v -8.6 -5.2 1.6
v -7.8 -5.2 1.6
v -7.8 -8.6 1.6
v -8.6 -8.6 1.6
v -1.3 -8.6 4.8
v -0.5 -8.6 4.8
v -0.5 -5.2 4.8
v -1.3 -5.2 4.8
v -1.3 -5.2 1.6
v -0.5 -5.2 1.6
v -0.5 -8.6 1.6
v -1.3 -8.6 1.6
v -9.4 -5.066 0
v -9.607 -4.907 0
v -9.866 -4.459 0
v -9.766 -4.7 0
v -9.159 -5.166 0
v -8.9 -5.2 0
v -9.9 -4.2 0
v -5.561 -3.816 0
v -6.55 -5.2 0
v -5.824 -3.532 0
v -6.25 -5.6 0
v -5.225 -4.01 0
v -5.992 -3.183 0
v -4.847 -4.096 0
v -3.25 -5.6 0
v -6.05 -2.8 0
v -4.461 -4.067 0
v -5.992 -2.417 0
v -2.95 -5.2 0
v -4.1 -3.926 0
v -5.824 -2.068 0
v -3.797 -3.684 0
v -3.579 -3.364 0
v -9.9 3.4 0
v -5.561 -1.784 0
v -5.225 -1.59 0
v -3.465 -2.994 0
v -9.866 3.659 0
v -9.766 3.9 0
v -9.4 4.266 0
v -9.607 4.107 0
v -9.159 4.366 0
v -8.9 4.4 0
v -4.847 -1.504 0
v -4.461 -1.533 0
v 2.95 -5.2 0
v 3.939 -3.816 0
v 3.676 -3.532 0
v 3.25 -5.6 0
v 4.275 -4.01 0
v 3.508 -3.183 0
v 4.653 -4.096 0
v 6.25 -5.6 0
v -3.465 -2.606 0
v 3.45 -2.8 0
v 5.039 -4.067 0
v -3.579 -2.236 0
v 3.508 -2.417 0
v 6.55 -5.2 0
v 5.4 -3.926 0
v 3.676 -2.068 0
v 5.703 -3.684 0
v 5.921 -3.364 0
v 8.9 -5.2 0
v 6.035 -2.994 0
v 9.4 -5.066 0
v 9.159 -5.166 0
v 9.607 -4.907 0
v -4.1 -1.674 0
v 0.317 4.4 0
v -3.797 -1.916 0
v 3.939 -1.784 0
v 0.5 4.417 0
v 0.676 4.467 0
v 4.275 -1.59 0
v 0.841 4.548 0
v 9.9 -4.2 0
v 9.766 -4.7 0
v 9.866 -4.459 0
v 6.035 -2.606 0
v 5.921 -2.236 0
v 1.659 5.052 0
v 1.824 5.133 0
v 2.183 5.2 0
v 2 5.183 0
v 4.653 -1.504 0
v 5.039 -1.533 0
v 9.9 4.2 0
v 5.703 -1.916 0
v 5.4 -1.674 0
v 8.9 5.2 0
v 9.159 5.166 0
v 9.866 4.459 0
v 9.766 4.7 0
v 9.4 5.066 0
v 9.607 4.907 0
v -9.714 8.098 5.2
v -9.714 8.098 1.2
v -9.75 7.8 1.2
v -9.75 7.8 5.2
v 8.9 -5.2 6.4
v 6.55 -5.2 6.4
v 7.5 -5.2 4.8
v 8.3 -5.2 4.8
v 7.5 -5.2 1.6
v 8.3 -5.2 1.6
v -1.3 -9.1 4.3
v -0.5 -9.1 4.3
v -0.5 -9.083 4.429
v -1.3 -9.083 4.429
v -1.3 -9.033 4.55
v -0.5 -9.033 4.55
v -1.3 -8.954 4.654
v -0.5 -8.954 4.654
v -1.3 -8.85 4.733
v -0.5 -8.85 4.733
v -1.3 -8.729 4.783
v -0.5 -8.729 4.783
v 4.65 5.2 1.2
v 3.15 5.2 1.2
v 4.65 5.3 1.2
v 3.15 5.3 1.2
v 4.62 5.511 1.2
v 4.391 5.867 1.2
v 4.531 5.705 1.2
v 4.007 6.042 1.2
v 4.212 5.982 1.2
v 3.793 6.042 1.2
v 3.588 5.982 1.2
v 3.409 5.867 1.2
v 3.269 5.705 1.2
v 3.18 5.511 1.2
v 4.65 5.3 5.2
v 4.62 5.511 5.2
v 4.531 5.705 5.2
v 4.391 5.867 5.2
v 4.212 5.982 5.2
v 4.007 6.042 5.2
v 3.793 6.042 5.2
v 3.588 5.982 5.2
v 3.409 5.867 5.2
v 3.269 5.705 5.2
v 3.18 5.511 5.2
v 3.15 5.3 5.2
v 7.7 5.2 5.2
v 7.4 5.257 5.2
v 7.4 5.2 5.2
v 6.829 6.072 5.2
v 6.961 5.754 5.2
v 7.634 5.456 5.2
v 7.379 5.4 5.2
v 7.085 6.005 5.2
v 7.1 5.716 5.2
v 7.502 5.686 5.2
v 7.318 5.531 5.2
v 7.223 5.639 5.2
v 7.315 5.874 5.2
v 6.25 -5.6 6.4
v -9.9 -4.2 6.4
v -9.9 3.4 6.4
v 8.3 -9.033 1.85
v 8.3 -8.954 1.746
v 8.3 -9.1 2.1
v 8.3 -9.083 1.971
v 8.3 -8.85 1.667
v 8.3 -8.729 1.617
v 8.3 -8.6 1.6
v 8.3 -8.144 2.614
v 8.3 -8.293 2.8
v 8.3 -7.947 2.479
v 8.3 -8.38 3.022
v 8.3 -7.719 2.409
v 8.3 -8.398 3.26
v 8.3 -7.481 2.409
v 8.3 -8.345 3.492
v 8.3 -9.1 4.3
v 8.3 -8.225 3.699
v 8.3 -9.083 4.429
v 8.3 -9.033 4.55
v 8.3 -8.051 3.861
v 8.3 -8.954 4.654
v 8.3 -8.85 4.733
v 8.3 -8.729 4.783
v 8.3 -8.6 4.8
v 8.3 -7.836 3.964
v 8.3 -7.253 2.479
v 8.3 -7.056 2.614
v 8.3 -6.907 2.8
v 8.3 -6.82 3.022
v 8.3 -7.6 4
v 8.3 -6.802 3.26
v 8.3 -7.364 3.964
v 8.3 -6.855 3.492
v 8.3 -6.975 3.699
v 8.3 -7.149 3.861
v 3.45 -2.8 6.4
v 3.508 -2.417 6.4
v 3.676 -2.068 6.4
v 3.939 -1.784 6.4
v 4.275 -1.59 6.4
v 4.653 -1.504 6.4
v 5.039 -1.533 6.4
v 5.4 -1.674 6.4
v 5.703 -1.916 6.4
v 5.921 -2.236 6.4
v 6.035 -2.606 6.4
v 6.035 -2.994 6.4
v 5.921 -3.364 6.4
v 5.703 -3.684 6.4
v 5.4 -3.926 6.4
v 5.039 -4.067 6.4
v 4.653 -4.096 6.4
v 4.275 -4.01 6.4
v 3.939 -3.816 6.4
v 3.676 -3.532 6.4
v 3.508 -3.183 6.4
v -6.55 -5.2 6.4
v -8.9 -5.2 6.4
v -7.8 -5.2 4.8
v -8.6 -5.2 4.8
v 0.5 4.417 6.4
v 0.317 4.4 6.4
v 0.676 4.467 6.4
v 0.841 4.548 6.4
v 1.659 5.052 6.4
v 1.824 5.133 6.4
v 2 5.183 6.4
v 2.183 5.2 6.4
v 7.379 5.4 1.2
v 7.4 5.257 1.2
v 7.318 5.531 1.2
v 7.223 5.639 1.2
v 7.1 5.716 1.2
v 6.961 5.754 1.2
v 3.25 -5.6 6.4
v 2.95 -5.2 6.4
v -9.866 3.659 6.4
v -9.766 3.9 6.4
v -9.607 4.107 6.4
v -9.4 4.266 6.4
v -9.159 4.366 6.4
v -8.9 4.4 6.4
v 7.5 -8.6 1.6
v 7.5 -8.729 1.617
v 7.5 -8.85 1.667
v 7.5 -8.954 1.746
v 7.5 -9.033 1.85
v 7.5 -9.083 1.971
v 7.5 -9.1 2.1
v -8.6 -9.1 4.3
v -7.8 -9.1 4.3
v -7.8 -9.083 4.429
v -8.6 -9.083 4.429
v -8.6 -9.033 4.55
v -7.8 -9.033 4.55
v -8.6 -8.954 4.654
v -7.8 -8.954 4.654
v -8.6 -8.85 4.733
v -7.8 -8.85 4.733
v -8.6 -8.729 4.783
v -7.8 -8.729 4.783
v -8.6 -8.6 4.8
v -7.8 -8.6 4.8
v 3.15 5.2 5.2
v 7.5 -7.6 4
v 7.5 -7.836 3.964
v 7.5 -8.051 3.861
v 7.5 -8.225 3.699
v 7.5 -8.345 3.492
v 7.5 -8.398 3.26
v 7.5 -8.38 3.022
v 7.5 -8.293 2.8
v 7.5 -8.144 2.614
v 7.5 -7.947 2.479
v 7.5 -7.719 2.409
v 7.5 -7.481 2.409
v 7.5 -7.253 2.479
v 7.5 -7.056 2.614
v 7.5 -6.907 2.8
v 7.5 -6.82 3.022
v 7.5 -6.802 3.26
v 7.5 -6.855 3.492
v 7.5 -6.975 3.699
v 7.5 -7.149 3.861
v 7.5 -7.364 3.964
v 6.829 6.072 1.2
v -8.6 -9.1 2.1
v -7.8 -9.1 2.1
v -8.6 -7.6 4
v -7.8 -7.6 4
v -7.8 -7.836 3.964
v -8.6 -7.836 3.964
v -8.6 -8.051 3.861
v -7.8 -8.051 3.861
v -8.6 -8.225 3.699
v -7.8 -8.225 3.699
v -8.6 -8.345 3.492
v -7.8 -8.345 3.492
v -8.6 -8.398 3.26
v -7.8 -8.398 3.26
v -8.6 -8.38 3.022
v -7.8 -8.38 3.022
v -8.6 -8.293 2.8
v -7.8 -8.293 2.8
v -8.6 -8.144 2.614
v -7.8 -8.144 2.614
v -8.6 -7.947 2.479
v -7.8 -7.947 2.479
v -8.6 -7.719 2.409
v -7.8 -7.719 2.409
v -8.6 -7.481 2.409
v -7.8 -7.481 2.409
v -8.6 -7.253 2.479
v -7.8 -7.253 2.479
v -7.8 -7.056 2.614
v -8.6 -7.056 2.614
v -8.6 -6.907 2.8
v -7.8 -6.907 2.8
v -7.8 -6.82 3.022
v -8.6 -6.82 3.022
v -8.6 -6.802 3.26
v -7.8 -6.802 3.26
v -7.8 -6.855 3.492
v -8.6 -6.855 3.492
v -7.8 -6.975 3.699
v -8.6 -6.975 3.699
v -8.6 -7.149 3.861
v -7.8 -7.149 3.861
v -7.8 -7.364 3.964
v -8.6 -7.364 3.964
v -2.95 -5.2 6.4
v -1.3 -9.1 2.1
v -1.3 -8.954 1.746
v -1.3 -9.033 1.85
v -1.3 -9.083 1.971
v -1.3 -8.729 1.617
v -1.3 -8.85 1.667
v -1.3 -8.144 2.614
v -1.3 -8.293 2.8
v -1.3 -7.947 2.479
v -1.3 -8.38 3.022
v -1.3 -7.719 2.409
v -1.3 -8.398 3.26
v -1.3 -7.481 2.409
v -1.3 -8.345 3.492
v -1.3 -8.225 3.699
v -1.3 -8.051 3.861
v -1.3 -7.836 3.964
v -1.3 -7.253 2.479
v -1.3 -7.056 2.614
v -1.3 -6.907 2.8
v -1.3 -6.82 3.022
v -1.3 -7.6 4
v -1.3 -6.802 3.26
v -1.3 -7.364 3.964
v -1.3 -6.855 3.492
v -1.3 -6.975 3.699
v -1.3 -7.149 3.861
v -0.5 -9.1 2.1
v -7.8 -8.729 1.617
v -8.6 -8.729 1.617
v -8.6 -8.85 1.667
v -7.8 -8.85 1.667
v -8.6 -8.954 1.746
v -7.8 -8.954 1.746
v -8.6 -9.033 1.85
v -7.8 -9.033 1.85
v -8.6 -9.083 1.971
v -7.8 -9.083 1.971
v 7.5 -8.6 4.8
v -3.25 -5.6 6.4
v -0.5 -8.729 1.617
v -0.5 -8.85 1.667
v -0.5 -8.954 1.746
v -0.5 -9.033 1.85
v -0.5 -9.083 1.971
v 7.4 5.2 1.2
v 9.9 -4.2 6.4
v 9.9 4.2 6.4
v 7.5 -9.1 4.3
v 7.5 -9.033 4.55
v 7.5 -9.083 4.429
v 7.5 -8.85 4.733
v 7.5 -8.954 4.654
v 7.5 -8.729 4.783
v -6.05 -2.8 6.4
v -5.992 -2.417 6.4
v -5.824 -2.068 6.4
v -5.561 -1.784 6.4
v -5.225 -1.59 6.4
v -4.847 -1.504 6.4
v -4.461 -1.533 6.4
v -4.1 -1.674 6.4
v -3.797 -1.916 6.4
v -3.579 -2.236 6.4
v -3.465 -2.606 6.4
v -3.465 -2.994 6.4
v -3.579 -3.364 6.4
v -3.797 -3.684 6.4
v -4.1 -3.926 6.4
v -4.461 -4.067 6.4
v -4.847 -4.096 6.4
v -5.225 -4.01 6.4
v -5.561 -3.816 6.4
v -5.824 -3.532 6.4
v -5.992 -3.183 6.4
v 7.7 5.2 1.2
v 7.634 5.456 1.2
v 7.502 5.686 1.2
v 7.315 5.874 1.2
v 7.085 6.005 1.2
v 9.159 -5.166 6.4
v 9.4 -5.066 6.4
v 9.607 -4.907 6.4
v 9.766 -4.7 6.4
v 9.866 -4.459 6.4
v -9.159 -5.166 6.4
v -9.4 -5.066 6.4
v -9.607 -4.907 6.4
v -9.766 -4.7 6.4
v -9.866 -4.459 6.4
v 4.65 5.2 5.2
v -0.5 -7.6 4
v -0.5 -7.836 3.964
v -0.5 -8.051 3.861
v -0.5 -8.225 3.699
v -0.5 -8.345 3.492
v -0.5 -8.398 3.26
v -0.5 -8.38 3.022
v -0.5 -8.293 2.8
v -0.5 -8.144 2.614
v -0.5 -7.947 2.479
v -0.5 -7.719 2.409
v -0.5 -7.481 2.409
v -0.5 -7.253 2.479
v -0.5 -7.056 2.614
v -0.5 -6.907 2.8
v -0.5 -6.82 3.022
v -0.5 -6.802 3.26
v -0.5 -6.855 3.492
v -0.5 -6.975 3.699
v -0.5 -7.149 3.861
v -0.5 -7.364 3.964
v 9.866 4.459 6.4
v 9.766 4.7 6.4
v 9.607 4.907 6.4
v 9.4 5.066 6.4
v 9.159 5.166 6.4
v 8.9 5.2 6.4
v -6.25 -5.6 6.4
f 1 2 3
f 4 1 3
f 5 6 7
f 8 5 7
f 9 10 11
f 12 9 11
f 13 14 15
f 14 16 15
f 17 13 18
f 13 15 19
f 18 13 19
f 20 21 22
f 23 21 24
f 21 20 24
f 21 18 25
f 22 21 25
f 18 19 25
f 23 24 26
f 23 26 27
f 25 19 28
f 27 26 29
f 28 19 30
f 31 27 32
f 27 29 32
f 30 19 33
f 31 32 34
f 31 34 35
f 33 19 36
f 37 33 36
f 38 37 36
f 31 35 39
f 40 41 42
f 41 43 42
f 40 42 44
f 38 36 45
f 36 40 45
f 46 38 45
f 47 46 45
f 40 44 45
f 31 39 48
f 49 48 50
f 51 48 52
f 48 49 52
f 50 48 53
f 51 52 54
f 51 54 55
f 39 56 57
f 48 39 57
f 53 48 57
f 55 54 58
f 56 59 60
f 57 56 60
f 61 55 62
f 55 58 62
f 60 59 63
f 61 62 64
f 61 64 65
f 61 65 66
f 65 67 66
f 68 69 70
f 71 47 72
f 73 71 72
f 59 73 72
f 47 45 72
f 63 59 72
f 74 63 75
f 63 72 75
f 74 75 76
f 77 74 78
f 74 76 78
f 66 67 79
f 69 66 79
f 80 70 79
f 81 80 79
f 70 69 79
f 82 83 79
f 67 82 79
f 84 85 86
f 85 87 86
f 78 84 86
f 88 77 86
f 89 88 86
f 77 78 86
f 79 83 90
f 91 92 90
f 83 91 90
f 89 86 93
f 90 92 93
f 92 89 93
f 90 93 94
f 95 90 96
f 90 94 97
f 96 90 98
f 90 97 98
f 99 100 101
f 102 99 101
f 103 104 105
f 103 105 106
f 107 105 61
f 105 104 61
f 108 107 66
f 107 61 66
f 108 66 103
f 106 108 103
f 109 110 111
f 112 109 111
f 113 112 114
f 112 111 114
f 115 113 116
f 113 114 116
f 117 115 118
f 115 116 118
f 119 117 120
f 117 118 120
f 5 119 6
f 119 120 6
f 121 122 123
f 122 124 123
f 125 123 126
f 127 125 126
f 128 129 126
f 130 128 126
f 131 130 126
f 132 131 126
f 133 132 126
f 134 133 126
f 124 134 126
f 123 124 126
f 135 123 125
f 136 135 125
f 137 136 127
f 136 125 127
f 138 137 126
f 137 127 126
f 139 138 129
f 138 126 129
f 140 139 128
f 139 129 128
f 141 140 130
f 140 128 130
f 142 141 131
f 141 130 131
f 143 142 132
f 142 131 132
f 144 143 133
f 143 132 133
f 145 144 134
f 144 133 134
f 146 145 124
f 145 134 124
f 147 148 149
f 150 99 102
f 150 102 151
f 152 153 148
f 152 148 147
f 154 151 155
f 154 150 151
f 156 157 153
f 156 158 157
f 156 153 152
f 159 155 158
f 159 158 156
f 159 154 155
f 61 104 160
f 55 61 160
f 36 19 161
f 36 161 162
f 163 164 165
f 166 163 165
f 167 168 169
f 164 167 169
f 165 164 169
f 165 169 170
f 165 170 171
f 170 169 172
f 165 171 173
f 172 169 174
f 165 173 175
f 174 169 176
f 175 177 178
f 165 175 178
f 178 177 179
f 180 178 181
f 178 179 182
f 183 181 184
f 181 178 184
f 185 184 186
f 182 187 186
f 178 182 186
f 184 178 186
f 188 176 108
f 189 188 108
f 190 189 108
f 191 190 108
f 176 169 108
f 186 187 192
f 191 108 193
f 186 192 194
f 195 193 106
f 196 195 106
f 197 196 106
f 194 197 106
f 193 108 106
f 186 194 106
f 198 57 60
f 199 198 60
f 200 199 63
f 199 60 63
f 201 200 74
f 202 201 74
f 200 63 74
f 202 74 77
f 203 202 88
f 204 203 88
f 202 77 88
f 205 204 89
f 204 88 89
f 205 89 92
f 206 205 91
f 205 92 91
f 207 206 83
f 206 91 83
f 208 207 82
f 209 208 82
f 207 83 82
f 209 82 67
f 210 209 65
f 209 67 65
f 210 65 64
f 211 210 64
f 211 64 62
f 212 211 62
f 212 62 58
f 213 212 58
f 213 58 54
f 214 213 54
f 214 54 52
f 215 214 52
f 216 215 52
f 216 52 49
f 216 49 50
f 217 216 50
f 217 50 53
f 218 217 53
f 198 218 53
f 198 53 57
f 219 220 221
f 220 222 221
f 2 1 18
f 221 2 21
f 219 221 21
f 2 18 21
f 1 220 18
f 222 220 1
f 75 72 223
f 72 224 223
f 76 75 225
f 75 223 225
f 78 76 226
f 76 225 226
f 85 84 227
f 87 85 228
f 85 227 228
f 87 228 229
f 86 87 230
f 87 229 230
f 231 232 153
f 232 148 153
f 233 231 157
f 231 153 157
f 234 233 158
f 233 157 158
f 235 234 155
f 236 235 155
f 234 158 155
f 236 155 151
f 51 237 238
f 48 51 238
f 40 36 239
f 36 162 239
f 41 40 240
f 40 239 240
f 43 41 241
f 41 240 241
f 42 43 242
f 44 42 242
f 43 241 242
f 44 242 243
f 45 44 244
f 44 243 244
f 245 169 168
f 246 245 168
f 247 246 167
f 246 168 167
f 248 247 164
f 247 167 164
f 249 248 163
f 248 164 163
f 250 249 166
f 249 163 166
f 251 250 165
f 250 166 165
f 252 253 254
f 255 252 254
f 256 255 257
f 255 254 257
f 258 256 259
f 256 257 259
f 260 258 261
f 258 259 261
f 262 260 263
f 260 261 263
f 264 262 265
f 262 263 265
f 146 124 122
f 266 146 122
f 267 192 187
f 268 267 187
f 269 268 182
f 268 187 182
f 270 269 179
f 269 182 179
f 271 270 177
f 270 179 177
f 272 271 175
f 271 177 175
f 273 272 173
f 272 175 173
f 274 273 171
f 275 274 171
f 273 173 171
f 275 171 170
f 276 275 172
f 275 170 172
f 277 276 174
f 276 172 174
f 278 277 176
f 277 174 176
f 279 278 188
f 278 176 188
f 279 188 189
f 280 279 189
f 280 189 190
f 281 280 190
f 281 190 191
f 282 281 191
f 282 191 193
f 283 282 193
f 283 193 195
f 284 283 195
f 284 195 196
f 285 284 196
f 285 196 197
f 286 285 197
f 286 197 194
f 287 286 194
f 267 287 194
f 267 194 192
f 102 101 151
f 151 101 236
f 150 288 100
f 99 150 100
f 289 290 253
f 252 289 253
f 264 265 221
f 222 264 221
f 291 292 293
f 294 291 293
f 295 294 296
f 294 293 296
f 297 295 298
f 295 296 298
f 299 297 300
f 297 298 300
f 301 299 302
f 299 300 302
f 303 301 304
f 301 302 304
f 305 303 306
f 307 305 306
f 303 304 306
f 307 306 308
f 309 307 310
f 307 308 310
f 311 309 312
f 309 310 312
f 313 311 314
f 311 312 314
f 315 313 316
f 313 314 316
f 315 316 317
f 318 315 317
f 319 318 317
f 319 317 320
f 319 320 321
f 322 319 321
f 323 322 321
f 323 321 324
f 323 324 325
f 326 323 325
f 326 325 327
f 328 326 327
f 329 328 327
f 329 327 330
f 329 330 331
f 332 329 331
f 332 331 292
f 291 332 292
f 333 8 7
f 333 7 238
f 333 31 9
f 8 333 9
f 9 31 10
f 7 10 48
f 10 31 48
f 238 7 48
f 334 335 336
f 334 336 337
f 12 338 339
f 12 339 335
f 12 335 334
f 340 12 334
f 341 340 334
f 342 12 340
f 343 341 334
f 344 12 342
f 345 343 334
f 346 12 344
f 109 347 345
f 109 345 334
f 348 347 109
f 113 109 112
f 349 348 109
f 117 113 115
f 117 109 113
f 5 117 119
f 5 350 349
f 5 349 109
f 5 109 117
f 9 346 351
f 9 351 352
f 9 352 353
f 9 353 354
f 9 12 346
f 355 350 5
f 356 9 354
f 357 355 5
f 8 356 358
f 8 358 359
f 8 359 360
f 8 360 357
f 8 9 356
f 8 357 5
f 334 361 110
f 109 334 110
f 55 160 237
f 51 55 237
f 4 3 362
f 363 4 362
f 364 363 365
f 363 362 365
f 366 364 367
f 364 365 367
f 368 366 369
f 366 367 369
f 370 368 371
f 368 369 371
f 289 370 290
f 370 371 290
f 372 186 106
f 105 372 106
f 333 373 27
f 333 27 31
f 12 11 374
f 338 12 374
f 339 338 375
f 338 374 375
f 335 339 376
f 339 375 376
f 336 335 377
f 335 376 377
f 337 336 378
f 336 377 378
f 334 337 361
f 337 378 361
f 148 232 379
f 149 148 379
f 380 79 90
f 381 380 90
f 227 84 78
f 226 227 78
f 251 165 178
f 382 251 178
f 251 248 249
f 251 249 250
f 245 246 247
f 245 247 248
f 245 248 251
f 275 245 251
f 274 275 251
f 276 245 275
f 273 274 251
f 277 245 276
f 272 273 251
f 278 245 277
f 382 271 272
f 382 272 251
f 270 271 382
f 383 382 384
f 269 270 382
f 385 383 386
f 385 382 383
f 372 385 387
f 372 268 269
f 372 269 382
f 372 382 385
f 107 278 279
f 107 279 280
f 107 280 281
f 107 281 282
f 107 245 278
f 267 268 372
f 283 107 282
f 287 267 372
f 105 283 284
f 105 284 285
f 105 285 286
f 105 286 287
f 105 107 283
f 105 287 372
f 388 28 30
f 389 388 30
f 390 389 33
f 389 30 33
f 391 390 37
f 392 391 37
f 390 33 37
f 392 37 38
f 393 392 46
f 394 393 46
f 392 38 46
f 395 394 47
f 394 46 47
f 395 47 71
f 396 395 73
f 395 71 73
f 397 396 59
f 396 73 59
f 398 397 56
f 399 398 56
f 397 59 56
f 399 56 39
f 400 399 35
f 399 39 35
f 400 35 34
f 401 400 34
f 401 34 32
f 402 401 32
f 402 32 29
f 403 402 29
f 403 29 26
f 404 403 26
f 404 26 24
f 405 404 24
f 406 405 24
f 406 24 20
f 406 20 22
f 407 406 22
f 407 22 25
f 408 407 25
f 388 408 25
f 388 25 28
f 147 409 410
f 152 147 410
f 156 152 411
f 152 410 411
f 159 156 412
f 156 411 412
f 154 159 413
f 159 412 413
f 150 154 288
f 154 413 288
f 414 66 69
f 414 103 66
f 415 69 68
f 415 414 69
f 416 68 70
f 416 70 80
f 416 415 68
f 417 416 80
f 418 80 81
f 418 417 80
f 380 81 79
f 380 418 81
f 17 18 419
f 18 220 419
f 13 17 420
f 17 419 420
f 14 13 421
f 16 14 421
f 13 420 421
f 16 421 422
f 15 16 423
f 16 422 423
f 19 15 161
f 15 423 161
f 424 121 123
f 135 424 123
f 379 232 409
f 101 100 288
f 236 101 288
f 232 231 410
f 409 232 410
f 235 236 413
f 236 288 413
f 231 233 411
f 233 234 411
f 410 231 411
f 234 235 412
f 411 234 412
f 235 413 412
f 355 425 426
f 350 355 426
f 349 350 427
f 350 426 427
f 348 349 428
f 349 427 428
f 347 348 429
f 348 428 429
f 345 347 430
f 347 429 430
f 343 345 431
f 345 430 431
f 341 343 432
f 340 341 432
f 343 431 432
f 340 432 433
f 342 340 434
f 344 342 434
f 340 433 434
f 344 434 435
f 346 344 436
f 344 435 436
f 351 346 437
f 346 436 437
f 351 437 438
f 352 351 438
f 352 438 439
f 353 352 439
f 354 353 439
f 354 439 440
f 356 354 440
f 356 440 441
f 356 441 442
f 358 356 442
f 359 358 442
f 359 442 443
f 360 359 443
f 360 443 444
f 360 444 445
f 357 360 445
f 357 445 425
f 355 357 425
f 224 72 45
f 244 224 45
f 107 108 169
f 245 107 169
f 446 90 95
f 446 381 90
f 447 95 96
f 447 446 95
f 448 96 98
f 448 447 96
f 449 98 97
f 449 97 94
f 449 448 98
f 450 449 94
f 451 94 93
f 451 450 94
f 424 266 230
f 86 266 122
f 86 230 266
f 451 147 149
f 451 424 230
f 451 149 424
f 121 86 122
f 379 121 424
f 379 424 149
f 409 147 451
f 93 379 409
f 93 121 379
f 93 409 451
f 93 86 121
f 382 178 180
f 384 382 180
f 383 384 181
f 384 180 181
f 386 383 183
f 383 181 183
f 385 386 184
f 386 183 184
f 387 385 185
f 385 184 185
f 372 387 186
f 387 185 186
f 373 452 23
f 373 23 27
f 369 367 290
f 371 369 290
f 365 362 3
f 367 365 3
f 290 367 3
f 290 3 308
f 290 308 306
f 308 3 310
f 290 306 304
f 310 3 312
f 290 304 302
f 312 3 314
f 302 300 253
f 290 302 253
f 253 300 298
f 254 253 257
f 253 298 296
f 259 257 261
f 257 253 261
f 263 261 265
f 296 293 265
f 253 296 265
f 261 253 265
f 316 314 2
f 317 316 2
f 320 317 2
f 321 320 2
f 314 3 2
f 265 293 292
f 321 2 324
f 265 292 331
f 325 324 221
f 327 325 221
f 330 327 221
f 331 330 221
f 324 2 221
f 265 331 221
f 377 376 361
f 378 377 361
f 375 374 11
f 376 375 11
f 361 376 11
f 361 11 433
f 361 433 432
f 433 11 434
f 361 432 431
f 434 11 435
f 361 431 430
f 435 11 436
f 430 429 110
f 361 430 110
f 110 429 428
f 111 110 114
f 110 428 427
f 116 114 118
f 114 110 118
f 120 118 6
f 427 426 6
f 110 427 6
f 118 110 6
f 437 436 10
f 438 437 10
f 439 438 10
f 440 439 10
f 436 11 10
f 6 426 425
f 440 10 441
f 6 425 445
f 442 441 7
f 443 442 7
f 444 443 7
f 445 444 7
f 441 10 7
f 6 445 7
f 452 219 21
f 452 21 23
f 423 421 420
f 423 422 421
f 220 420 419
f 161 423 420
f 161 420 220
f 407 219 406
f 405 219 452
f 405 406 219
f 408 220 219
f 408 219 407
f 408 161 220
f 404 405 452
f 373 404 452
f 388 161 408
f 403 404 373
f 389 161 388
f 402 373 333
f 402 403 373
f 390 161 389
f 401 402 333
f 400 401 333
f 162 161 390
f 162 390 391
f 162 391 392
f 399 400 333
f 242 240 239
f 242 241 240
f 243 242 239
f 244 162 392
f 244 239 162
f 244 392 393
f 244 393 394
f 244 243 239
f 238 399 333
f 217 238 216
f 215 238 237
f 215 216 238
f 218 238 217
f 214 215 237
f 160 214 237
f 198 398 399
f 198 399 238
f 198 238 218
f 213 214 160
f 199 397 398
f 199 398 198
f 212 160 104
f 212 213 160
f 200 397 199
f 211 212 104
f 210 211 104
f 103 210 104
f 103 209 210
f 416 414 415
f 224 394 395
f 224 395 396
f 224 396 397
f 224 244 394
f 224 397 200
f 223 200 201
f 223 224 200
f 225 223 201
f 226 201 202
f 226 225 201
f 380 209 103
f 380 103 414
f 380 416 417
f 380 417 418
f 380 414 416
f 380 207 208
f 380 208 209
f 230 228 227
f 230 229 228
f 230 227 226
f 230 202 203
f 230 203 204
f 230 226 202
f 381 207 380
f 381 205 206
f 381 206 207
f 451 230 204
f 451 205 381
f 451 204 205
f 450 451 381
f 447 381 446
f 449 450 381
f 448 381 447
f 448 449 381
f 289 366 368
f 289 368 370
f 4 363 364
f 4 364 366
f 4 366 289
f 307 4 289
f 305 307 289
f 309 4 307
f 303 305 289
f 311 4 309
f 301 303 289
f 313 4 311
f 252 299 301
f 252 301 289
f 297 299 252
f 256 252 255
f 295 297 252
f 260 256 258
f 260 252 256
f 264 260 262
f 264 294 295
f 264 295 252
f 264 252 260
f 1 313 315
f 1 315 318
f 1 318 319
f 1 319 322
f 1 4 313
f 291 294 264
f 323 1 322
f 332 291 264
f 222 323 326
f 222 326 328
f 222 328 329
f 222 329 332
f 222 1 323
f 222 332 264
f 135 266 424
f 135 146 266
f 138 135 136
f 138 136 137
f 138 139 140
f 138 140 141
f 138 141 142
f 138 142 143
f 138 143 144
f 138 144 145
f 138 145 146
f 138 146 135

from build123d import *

# Parameters (mm, degrees)
SKETCH_1_W          = 19.8
SKETCH_1_H          = 10.4
EXTRUDE_1_DEPTH     = 6.4
SKETCH_2_R          = 1.3
CUT_EXTRUDE_1_DEPTH = 13.884486796
EXTRUDE_2_DEPTH     = 0.8
EXTRUDE_3_DEPTH     = 0.8
EXTRUDE_4_DEPTH     = 0.8
SKETCH_8_R          = 0.8
CUT_EXTRUDE_3_DEPTH = 22.33096341
CUT_EXTRUDE_4_DEPTH = 15.892279879
FILLET_3_R          = 1
EXTRUDE_5_DEPTH     = 4
EXTRUDE_10_DEPTH    = 4
FILLET_4_R          = 0.5
FILLET_5_R          = 1
FILLET_6_R          = 1
FILLET_7_R          = 1
EXTRUDE_11_DEPTH    = 6.4


with BuildPart() as part:
    # 草图1 → 凸台-拉伸1 (new body)
    with BuildSketch(Plane.XY):
        Rectangle(SKETCH_1_W, SKETCH_1_H)
    extrude(amount=EXTRUDE_1_DEPTH)

    # 草图2 → 切除-拉伸1 (cut, through all)
    with BuildSketch(Plane(origin=(0, 0, 0), x_dir=(-1, 0, 0), z_dir=(0, 0, -1))):
        with Locations((-4.75, -2.8)):
            Circle(SKETCH_2_R)
        with Locations((4.75, -2.8)):
            Circle(SKETCH_2_R)
    extrude(amount=-CUT_EXTRUDE_1_DEPTH, mode=Mode.SUBTRACT)

    # 草图5 → 凸台-拉伸2 (add)
    with BuildSketch(Plane(origin=(8.3, 0, 0), x_dir=(0, 0, -1), z_dir=(1, 0, 0))):
        with BuildLine():
            Line((-4.8, -5.2), (-1.6, -5.2))
            Line((-1.6, -5.2), (-1.6, -8.6))
            ThreePointArc((-1.6, -8.6), (-1.746446609, -8.953553391), (-2.1, -9.1))
            Line((-2.1, -9.1), (-4.3, -9.1))
            ThreePointArc((-4.3, -9.1), (-4.653553391, -8.953553391), (-4.8, -8.6))
            Line((-4.8, -8.6), (-4.8, -5.2))
        make_face()
    extrude(amount=-EXTRUDE_2_DEPTH)

    # 草图6 → 凸台-拉伸3 (add)
    with BuildSketch(Plane(origin=(-0.5, 0, 0), x_dir=(0, 0, -1), z_dir=(1, 0, 0))):
        with BuildLine():
            Line((-4.8, -5.2), (-1.6, -5.2))
            Line((-1.6, -5.2), (-1.6, -8.6))
            ThreePointArc((-1.6, -8.6), (-1.746446609, -8.953553391), (-2.1, -9.1))
            Line((-2.1, -9.1), (-4.3, -9.1))
            ThreePointArc((-4.3, -9.1), (-4.653553391, -8.953553391), (-4.8, -8.6))
            Line((-4.8, -8.6), (-4.8, -5.2))
        make_face()
    extrude(amount=-EXTRUDE_3_DEPTH)

    # 草图7 → 凸台-拉伸4 (add)
    with BuildSketch(Plane(origin=(-7.8, 0, 0), x_dir=(0, 0, -1), z_dir=(1, 0, 0))):
        with BuildLine():
            Line((-4.8, -5.2), (-1.6, -5.2))
            Line((-1.6, -5.2), (-1.6, -8.6))
            ThreePointArc((-1.6, -8.6), (-1.746446609, -8.953553391), (-2.1, -9.1))
            Line((-2.1, -9.1), (-4.3, -9.1))
            ThreePointArc((-4.3, -9.1), (-4.653553391, -8.953553391), (-4.8, -8.6))
            Line((-4.8, -8.6), (-4.8, -5.2))
        make_face()
    extrude(amount=-EXTRUDE_4_DEPTH)

    # 草图8 → 切除-拉伸3 (cut, through all)
    with BuildSketch(Plane(origin=(8.3, 0, 0), x_dir=(0, 0, -1), z_dir=(1, 0, 0))):
        with Locations(Location((-3.2, -7.6, 0), (0, 0, 180))):
            Circle(SKETCH_8_R)
    extrude(amount=-CUT_EXTRUDE_3_DEPTH, mode=Mode.SUBTRACT)

    # 草图9 → 切除-拉伸4 (cut, through all)
    with BuildSketch(Plane(origin=(0, 0, 0), x_dir=(-1, 0, 0), z_dir=(0, 0, -1))):
        Polygon((-1.9, 5.2), (-0.6, 4.4), (9.9, 4.4), (9.9, 5.2), align=None)
    extrude(amount=-CUT_EXTRUDE_4_DEPTH, mode=Mode.SUBTRACT)

    # 圆角3
    fillet_3_edges = [part.edges().sort_by_distance(p)[0] for p in [
        (1.9, 5.2, 3.2),
        (0.6, 4.4, 3.2),
    ]]
    fillet(fillet_3_edges, radius=FILLET_3_R)

    # 草图10 → 凸台-拉伸5 (add)
    with BuildSketch(Plane.XY.offset(1.2)):
        with BuildLine():
            Line((3.15, 5.2), (4.65, 5.2))
            Line((4.65, 5.2), (4.65, 5.3))
            ThreePointArc((4.65, 5.3), (3.9, 6.05), (3.15, 5.3))
            Line((3.15, 5.3), (3.15, 5.2))
        make_face()
    extrude(amount=EXTRUDE_5_DEPTH)

    # 草图12 → 凸台-拉伸10 (add)
    with BuildSketch(Plane.XY.offset(1.2)):
        Polygon((7.4, 5.2), (7.4, 5), (7.7, 5), (7.7, 5.2), (7.7, 5.965506001), (-9.713537643, 8.097775917), (-9.75, 7.8), (7.4, 5.7), align=None)
    extrude(amount=EXTRUDE_10_DEPTH)

    # 圆角4
    fillet_4_edges = [part.edges().sort_by_distance(p)[0] for p in [
        (7.4, 5.7, 3.2),
    ]]
    fillet(fillet_4_edges, radius=FILLET_4_R)

    # 圆角5
    # the kernel refuses this fillet: 1 mm, written as the material it takes off along each edge
    with BuildSketch(Plane(origin=(7.7, 5.965506001, -0.994226351), x_dir=(0, -1, 0), z_dir=(0, 0, 1))) as fillet_5_piece_1:
        with BuildLine():
            CenterArc((0.885910836, -0.992724874), FILLET_5_R, 96.915467292, 76.103475301)
            Line((-0.106675553, -0.871183684), (-0.126527281, -0.86875286))
            Line((-0.126527281, -0.86875286), (-0.019851728, 0.002430824))
            Line((-0.019851728, 0.002430824), (0, 0.02))
            ThreePointArc((0, 0.02), (0.382753001, 0.02), (0.763097904, 0.019854497))
            Line((0.763097904, 0.019854497), (0.765506001, 0))
        make_face()
    extrude(amount=8.388452701, mode=Mode.SUBTRACT)

    # 圆角6
    fillet_6_edges = [part.edges().sort_by_distance(p)[0] for p in [
        (9.9, -5.2, 3.2),
        (-9.9, -5.2, 3.2),
    ]]
    fillet(fillet_6_edges, radius=FILLET_6_R)

    # 圆角7
    fillet_7_edges = [part.edges().sort_by_distance(p)[0] for p in [
        (9.9, 5.2, 3.2),
        (-9.9, 4.4, 3.2),
    ]]
    fillet(fillet_7_edges, radius=FILLET_7_R)

    # 草图13 → 凸台-拉伸11 (add)
    with BuildSketch(Plane.XY.offset(6.4)):
        Polygon((-6.55, -5.2), (-6.25, -5.6), (-3.25, -5.6), (-2.95, -5.2), align=None)
        Polygon((6.25, -5.6), (3.25, -5.6), (2.95, -5.2), (6.55, -5.2), align=None)
    extrude(amount=-EXTRUDE_11_DEPTH)


solid = part.part
